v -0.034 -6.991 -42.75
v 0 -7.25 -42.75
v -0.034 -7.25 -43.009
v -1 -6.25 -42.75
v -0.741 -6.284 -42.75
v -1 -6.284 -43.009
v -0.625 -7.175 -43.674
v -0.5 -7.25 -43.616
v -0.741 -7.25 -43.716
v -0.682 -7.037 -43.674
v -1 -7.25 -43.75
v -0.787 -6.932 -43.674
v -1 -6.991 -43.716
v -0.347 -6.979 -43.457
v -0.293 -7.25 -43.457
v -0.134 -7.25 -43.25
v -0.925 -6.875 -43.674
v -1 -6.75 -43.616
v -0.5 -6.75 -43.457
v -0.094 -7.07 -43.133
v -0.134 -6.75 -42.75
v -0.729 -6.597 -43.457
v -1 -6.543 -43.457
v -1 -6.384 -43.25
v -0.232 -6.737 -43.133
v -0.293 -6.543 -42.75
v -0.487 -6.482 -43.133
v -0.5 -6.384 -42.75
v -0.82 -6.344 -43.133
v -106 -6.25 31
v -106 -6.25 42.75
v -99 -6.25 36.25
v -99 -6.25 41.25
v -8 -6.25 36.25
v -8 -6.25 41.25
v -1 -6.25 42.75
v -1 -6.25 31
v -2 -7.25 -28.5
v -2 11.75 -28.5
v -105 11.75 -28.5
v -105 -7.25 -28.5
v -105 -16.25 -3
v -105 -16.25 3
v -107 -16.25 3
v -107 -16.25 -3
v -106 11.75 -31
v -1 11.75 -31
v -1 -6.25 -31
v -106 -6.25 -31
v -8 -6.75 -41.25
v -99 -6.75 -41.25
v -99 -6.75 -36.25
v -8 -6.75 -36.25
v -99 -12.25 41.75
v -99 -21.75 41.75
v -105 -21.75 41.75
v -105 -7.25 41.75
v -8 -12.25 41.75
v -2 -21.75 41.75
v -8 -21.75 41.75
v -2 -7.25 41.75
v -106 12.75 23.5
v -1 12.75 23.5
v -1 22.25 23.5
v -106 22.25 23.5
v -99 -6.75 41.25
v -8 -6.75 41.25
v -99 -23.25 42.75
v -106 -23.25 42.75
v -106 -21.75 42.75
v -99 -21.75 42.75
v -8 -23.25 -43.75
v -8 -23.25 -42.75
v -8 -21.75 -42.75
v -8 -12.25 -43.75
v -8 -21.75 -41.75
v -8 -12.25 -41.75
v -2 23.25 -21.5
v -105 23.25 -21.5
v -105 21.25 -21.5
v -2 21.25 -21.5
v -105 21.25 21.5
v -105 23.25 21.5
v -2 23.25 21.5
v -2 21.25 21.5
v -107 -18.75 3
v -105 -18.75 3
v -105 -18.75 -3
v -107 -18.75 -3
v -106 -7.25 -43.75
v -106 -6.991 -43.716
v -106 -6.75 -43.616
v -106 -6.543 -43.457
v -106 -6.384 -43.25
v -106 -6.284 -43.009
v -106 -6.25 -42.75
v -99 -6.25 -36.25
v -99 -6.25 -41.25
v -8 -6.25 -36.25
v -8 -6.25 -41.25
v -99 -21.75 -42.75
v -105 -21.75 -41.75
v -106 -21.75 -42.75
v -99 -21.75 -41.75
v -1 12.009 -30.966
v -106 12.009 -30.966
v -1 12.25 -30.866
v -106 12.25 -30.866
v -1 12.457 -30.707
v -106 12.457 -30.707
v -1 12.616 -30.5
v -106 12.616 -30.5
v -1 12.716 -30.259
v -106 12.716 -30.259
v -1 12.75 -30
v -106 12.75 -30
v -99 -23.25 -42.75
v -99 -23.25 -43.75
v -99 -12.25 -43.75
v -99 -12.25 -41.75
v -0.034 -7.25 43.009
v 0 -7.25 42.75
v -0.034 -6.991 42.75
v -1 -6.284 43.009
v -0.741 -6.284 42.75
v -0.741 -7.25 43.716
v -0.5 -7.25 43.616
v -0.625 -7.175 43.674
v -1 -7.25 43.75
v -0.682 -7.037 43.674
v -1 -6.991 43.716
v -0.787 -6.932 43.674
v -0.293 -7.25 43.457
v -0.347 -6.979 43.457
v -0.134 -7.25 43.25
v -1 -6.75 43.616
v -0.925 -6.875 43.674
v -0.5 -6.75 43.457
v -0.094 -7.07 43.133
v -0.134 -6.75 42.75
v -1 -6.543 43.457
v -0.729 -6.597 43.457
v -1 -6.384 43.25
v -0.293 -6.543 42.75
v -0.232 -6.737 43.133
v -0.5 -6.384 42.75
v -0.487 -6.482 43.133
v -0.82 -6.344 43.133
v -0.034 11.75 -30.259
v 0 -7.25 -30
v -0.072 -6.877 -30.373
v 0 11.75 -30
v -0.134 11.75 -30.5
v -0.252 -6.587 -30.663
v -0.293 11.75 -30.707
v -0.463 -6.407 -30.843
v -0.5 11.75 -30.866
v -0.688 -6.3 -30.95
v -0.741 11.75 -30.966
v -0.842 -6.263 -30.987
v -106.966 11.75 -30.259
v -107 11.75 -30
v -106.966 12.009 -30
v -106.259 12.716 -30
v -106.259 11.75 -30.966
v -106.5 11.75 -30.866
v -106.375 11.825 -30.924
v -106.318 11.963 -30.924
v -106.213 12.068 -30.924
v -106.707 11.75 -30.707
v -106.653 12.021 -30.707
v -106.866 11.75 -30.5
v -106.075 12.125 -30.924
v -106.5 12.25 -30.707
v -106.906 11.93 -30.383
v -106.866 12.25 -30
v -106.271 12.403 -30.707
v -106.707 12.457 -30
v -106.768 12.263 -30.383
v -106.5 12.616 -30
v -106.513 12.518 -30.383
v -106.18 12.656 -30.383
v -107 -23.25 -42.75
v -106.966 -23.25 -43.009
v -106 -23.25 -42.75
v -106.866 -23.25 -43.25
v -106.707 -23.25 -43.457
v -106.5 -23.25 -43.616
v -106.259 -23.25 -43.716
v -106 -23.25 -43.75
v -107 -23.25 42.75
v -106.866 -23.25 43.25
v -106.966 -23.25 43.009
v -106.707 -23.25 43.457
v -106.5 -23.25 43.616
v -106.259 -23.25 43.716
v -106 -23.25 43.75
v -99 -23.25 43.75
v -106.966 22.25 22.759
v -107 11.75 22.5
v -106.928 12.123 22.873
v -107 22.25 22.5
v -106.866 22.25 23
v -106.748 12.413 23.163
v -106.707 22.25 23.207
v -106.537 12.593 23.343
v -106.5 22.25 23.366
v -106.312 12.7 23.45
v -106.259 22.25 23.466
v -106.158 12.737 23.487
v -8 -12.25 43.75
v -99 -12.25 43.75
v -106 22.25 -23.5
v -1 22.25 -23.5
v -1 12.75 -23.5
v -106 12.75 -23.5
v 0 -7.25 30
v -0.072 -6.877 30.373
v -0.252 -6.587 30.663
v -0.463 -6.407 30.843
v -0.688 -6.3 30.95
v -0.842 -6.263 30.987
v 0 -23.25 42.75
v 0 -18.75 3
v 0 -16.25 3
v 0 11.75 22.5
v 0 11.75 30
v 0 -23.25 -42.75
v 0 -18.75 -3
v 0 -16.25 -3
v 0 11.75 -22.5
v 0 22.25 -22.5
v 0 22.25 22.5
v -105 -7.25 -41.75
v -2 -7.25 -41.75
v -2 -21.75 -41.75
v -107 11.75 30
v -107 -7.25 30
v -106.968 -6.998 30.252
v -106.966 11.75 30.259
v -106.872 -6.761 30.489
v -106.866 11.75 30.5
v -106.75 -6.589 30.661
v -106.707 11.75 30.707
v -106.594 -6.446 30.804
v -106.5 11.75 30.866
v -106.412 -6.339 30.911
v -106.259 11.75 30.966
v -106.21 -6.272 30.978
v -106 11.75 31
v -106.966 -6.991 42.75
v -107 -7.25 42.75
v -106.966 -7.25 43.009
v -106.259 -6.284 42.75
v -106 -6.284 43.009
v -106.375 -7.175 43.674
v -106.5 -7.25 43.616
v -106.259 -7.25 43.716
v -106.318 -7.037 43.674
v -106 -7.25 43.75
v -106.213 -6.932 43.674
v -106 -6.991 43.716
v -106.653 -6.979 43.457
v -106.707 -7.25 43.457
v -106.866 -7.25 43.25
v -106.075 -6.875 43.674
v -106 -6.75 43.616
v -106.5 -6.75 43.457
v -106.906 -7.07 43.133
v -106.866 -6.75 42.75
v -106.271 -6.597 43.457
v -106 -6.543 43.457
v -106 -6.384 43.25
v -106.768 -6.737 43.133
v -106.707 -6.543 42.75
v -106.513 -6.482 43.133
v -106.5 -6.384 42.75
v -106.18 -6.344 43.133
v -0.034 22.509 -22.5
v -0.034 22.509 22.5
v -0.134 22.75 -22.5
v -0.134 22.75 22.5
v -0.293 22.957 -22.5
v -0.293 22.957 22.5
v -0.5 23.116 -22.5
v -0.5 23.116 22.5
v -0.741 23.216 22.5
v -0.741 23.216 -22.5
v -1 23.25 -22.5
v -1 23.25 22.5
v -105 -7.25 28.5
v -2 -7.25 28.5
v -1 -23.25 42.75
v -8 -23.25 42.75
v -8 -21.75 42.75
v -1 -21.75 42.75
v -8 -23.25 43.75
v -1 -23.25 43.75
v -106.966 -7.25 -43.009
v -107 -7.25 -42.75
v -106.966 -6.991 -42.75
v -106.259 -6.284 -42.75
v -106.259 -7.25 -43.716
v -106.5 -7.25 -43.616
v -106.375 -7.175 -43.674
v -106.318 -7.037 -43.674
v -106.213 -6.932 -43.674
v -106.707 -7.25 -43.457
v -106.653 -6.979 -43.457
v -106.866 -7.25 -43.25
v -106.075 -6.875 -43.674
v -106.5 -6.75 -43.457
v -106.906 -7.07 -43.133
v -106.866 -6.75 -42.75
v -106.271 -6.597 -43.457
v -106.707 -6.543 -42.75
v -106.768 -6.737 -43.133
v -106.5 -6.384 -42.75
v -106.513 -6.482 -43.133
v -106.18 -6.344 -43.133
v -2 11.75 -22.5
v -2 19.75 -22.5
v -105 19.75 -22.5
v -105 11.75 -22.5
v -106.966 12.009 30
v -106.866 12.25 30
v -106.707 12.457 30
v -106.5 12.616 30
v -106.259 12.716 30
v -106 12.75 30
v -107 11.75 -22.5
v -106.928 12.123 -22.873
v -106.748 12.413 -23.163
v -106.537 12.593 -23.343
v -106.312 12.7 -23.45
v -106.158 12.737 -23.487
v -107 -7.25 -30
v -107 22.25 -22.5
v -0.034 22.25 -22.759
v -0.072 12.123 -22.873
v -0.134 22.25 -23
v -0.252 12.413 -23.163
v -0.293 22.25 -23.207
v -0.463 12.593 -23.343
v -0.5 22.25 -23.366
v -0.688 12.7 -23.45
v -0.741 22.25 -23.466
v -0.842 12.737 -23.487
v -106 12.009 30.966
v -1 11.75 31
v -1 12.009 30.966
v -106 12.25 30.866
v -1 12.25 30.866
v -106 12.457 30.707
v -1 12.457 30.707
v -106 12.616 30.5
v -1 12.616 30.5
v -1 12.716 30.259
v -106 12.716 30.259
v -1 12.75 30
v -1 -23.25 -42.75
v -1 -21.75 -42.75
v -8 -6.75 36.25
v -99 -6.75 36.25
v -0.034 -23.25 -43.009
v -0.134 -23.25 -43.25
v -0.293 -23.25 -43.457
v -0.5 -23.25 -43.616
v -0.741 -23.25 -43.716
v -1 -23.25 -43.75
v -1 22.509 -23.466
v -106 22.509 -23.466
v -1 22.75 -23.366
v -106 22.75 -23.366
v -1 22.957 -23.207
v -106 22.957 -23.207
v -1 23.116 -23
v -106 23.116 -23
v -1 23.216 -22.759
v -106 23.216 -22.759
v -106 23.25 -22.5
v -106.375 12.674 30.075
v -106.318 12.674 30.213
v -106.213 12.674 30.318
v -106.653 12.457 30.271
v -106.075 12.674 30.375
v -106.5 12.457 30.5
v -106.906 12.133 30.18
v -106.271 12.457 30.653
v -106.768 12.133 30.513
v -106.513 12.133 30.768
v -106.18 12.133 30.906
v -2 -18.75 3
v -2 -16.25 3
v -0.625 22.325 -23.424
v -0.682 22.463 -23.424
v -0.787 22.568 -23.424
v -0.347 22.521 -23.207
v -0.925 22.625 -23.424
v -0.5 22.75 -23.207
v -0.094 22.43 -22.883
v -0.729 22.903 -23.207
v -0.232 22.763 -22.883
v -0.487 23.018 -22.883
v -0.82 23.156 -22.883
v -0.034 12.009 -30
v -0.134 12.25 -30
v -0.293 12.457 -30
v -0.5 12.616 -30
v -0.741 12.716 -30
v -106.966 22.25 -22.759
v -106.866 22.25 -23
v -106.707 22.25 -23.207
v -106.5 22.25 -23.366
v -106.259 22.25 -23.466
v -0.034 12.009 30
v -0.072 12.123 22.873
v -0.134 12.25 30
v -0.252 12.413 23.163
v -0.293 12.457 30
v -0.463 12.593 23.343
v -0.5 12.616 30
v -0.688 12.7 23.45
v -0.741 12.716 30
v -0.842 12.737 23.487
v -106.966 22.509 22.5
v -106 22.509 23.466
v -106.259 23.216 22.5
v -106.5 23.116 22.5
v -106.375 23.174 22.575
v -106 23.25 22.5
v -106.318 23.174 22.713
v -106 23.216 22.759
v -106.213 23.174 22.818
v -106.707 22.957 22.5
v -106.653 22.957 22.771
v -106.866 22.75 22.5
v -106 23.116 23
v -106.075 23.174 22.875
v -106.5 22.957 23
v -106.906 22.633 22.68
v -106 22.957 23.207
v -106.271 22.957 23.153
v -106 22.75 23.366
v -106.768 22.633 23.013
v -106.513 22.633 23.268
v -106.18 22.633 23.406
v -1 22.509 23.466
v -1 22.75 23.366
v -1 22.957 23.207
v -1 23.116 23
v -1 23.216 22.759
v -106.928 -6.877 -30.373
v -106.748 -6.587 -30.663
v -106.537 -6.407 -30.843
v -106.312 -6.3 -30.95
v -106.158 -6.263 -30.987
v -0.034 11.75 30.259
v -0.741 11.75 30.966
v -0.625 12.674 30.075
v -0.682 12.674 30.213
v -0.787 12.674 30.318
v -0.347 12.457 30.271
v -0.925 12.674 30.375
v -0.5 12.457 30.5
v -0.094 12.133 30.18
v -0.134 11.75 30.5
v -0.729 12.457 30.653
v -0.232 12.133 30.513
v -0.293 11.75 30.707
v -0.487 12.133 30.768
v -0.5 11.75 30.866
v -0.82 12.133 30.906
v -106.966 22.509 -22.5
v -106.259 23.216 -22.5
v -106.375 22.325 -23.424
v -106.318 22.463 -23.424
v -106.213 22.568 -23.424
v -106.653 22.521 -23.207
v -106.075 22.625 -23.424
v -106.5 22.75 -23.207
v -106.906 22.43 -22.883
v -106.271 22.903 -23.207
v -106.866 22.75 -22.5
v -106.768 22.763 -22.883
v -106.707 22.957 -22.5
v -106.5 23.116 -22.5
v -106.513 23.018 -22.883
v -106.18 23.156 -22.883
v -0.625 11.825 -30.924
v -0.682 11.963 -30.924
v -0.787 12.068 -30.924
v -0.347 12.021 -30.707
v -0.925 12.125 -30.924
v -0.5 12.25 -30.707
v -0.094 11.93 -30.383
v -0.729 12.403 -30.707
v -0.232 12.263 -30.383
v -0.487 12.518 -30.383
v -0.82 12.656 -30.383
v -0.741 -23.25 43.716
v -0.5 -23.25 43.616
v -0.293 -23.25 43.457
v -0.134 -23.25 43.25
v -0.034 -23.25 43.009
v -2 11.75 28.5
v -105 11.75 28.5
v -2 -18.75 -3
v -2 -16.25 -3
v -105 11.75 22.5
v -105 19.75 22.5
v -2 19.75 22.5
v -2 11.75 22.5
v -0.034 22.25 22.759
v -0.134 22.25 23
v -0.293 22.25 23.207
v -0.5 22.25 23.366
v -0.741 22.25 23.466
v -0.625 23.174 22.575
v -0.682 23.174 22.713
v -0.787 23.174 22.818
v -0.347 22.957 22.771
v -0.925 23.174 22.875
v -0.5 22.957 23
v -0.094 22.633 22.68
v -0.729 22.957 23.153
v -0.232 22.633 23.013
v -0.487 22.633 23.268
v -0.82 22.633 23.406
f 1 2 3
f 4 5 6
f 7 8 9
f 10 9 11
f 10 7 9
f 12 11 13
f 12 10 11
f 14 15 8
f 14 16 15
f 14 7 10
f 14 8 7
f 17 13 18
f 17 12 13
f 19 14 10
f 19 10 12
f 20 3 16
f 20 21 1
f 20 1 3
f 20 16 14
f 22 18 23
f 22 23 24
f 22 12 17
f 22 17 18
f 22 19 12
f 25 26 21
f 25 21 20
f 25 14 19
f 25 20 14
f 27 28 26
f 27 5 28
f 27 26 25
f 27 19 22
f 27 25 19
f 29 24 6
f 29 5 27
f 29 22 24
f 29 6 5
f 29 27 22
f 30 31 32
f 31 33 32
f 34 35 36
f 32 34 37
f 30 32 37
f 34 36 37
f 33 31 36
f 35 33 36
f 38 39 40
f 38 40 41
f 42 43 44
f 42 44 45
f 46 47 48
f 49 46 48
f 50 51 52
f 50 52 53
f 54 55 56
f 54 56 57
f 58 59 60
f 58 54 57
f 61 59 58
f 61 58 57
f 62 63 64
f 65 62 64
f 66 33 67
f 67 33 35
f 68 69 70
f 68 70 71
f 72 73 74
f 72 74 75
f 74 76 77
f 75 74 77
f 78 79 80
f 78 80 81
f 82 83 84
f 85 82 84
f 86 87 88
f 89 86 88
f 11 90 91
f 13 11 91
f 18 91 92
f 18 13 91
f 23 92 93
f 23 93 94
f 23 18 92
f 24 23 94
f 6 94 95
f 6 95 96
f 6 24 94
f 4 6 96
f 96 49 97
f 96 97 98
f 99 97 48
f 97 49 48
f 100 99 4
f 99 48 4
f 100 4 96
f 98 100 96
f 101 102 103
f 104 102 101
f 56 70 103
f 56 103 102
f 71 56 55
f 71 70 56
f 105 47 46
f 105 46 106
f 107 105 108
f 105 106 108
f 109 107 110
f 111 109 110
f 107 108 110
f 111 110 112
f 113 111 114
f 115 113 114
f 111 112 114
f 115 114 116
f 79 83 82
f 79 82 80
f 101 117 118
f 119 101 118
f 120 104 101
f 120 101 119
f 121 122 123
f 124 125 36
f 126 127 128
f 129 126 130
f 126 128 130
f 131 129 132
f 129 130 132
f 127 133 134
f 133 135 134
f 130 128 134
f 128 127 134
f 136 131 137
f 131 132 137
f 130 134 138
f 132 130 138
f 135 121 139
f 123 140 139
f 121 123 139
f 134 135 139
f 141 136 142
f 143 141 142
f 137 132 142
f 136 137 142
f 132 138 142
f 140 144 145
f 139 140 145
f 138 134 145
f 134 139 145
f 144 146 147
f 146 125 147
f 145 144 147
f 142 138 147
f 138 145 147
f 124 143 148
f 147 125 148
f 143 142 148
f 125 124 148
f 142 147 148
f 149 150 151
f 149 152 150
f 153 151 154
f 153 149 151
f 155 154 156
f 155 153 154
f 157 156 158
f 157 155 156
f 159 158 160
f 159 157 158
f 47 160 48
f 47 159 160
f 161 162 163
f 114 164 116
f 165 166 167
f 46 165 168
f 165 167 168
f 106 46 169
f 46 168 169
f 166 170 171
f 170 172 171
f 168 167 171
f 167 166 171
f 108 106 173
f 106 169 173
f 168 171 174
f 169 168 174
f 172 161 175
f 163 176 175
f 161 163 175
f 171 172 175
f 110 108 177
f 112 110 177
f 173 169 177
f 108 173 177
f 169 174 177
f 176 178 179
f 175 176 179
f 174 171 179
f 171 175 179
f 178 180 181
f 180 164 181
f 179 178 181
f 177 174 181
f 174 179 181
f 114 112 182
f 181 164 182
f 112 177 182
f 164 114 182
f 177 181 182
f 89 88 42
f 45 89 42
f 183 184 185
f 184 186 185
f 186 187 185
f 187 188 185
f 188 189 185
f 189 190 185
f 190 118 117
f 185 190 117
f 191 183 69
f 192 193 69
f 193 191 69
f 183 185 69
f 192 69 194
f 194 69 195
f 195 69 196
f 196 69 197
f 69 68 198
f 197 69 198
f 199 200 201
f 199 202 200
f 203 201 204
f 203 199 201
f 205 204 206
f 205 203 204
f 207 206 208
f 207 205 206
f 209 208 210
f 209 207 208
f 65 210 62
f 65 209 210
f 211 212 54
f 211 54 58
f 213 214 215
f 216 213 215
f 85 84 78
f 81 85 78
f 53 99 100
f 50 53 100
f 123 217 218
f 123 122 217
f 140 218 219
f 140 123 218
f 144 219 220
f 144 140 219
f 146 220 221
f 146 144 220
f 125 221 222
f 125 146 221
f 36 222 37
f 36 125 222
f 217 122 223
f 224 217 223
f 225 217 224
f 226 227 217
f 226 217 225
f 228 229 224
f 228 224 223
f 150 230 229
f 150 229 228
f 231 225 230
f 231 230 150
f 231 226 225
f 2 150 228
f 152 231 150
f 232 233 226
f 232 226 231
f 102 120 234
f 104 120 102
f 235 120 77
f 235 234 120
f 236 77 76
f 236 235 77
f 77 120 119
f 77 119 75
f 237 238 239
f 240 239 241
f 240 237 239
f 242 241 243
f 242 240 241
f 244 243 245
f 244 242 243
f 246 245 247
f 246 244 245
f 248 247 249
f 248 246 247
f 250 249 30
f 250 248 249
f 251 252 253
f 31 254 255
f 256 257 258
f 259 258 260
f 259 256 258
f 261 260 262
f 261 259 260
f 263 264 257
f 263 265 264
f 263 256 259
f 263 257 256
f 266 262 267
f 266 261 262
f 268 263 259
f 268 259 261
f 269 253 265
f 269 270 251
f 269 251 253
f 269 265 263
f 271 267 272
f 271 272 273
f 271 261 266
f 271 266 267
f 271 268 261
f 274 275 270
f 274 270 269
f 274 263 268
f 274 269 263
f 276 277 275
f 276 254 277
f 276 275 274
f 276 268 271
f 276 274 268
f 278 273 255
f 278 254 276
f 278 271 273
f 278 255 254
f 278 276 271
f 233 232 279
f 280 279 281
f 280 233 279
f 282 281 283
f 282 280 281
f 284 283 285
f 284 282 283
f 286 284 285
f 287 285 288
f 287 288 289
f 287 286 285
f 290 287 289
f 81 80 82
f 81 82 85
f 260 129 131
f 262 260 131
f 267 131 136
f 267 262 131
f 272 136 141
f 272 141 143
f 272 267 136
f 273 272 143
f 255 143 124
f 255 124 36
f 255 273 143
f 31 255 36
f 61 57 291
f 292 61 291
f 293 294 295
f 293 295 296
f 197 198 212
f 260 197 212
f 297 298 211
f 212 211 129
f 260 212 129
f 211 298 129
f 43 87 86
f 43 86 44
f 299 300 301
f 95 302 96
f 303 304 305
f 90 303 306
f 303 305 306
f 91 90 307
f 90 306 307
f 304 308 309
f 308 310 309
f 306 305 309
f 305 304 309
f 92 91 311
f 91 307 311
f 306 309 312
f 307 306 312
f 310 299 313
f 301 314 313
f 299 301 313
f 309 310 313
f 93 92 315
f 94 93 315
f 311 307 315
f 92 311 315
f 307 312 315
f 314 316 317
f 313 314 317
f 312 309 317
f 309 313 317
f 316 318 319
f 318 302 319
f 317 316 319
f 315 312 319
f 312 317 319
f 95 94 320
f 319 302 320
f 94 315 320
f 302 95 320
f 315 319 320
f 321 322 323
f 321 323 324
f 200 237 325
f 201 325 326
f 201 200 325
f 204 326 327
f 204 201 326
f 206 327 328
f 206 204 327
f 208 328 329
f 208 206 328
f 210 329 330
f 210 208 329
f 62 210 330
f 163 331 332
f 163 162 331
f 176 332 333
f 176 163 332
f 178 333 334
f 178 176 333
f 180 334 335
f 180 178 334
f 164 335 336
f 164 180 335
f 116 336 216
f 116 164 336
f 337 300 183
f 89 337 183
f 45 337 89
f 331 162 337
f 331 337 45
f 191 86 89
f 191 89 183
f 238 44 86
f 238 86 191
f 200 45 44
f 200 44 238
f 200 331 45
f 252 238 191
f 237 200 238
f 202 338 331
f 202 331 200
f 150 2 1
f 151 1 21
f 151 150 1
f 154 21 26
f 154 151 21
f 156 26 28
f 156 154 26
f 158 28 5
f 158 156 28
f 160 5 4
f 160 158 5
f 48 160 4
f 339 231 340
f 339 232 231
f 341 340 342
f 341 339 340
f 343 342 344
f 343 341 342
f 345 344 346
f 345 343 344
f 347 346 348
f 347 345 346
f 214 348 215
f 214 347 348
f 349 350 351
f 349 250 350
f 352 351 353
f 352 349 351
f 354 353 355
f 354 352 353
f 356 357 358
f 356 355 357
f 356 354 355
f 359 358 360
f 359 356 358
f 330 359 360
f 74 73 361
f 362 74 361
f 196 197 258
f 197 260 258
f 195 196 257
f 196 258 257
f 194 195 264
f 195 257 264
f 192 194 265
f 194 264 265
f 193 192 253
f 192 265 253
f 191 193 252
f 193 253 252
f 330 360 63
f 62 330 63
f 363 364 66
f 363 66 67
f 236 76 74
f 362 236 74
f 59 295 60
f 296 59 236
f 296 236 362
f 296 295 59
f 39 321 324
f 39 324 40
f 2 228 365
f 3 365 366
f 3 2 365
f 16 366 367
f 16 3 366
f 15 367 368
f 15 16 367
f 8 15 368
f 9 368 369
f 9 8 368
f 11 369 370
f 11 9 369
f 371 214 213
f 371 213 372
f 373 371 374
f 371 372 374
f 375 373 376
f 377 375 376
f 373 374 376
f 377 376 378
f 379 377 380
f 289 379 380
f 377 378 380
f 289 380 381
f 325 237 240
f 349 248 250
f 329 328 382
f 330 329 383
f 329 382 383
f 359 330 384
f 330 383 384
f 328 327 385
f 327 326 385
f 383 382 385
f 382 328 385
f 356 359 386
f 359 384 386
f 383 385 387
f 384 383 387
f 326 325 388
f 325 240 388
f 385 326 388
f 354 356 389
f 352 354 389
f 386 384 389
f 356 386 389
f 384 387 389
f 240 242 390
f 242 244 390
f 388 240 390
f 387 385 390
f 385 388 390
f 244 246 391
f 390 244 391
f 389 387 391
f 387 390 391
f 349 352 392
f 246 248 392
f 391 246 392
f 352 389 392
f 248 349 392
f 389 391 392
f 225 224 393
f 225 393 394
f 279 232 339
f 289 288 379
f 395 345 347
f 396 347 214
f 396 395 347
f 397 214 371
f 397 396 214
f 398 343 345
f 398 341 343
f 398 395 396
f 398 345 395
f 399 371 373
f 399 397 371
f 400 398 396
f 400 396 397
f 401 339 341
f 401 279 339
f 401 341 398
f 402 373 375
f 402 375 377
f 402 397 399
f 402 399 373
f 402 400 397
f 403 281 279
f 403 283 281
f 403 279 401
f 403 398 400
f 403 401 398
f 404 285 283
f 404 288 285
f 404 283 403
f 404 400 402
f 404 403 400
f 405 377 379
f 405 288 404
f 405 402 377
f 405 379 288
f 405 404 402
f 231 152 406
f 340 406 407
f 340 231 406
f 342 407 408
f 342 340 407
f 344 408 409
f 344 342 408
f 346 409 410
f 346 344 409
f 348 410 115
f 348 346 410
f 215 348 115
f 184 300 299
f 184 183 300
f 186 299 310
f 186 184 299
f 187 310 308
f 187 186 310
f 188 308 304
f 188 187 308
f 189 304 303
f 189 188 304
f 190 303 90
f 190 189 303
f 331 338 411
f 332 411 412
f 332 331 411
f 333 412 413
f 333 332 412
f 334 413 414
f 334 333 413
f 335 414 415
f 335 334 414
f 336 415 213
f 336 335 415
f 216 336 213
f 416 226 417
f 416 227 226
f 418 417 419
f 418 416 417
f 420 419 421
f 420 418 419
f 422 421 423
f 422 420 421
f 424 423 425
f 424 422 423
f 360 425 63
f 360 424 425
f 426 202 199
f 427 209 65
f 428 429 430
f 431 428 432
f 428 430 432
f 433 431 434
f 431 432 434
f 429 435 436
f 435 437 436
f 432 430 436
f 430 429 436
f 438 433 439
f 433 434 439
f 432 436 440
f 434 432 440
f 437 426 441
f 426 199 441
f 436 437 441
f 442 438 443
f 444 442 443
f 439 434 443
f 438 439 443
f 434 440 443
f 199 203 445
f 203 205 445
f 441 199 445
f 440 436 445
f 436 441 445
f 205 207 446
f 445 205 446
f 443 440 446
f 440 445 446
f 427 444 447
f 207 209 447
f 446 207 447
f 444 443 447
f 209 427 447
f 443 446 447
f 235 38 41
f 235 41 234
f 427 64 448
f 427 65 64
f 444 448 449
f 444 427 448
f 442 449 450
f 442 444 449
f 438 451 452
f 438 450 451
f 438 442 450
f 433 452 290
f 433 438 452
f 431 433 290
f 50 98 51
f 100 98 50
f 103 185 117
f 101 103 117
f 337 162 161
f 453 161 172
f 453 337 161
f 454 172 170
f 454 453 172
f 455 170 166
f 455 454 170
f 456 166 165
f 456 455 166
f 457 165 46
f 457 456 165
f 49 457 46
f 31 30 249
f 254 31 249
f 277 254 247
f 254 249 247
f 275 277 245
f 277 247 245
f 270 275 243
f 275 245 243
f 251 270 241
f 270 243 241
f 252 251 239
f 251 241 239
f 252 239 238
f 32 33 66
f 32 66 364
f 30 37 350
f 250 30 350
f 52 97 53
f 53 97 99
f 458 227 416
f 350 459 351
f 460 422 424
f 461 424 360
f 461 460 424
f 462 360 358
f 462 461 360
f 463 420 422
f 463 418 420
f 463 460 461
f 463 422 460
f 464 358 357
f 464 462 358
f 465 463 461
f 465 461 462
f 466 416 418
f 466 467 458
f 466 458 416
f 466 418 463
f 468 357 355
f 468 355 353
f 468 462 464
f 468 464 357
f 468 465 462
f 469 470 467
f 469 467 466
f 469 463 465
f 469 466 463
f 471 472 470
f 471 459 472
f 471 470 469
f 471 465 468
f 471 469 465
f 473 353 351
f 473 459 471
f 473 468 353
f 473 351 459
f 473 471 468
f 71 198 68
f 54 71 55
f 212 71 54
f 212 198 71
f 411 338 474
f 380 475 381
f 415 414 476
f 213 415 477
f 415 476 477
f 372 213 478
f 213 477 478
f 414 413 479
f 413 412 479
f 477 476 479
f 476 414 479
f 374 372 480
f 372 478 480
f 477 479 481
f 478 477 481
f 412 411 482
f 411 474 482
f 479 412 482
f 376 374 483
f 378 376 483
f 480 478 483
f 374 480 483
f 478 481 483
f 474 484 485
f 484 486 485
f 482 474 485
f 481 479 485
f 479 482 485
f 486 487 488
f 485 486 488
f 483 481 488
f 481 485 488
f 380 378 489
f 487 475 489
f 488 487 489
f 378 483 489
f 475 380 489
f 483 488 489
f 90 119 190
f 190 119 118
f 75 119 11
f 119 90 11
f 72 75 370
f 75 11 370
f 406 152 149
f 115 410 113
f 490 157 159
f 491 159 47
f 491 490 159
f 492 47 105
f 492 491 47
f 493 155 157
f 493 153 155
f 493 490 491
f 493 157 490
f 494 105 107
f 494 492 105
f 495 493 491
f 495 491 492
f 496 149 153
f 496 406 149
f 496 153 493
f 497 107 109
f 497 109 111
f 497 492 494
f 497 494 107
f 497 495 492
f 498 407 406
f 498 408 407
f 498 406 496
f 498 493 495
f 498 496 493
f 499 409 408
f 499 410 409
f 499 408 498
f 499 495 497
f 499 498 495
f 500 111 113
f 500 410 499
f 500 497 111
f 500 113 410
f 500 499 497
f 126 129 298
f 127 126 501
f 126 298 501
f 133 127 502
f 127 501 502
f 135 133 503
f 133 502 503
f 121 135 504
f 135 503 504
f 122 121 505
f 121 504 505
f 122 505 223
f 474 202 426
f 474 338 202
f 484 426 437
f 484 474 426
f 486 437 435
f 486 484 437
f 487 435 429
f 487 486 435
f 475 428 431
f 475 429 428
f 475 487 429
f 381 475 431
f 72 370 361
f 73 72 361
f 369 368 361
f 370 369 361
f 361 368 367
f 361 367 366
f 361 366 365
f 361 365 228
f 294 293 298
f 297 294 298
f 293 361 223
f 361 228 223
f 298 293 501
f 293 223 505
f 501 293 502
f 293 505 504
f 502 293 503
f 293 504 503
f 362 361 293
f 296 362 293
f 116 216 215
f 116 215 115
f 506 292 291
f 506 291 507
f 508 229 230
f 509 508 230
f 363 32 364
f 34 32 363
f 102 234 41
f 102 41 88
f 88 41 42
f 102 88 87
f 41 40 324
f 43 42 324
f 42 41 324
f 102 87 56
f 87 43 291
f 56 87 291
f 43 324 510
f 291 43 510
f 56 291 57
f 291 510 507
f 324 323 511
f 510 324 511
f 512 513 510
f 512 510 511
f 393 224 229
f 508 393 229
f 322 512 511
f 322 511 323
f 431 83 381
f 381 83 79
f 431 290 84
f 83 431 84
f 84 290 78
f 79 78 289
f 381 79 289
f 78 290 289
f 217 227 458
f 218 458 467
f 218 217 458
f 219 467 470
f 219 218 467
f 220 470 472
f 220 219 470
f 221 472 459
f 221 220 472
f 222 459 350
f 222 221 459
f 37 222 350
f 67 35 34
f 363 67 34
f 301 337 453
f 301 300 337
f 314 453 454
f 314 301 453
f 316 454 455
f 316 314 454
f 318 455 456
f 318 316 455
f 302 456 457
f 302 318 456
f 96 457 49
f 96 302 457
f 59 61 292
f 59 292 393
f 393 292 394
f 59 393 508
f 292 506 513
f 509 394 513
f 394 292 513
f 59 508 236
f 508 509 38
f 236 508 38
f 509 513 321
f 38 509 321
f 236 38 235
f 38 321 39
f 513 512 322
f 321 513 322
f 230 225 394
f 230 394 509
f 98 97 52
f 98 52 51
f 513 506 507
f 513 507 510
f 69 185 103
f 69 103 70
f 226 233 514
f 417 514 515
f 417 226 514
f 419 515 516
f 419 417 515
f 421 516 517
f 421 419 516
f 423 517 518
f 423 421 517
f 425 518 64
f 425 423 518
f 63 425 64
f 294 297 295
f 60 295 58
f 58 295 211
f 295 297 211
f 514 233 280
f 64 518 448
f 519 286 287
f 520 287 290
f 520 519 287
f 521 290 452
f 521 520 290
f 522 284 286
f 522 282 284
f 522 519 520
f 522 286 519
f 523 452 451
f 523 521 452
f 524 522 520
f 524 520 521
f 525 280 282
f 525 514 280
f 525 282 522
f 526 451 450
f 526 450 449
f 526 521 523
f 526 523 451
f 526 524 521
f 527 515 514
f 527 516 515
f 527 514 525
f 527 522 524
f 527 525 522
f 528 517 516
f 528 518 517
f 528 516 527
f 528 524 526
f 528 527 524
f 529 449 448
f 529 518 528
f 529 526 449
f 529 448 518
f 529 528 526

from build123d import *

# Parameters (mm, degrees)
BOSS_EXTRUDE1_DEPTH = 2
BOSS_EXTRUDE2_DEPTH = 103
BOSS_EXTRUDE3_DEPTH = 2
SKETCH4_W           = 103
SKETCH4_H           = 43
CUT_EXTRUDE1_DEPTH  = 2
SKETCH5_W           = 91
SKETCH5_H           = 5
CUT_EXTRUDE2_DEPTH  = 0.5
SKETCH7_W           = 105
SKETCH7_H           = 85.5
SKETCH7_W_2         = 103
SKETCH7_H_2         = 83.5
CUT_EXTRUDE3_DEPTH  = 1.5
CUT_EXTRUDE4_REACH  = 142.164
SKETCH8_W           = 91
SKETCH8_H           = 11
CUT_EXTRUDE5_REACH  = 119.914
SKETCH9_W           = 6
SKETCH9_H           = 2.5
FILLET1_R           = 1


with BuildPart() as part:
    # Sketch1 → Boss-Extrude1 (new body)
    with BuildSketch(Plane(origin=(0, 0, 0), x_dir=(0, 0, -1), z_dir=(1, 0, 0))):
        Polygon((-43.75, -23.25), (43.75, -23.25), (43.75, -6.25), (31, -6.25), (31, 12.75), (23.5, 12.75), (23.5, 23.25), (-23.5, 23.25), (-23.5, 12.75), (-31, 12.75), (-31, -6.25), (-43.75, -6.25), align=None)
    extrude(amount=-BOSS_EXTRUDE1_DEPTH)

    # Sketch2 → Boss-Extrude2 (add)
    with BuildSketch(Plane.ZY.offset(2)):
        Polygon((-43.75, -23.25), (-43.75, -6.25), (-31, -6.25), (-31, 12.75), (-23.5, 12.75), (-23.5, 23.25), (23.5, 23.25), (23.5, 12.75), (31, 12.75), (31, -6.25), (43.75, -6.25), (43.75, -23.25), (41.75, -23.25), (41.75, -7.25), (28.5, -7.25), (28.5, 11.75), (22.5, 11.75), (22.5, 19.75), (-22.5, 19.75), (-22.5, 11.75), (-28.5, 11.75), (-28.5, -7.25), (-41.75, -7.25), (-41.75, -23.25), align=None)
    extrude(amount=BOSS_EXTRUDE2_DEPTH)

    # Sketch3 → Boss-Extrude3 (add)
    with BuildSketch(Plane.ZY.offset(105)):
        Polygon((43.75, -23.25), (43.75, -6.25), (31, -6.25), (31, 12.75), (23.5, 12.75), (23.5, 23.25), (-23.5, 23.25), (-23.5, 12.75), (-31, 12.75), (-31, -6.25), (-43.75, -6.25), (-43.75, -23.25), align=None)
    extrude(amount=BOSS_EXTRUDE3_DEPTH)

    # Sketch4 → Cut-Extrude1 (cut)
    with BuildSketch(Plane(origin=(0, 23.25, 0), x_dir=(1, 0, 0), z_dir=(0, 1, 0))):
        with Locations((-53.5, 0)):
            Rectangle(SKETCH4_W, SKETCH4_H)
    extrude(amount=-CUT_EXTRUDE1_DEPTH, mode=Mode.SUBTRACT)

    # Sketch5 → Cut-Extrude2 (cut)
    with BuildSketch(Plane(origin=(0, -6.25, 0), x_dir=(1, 0, 0), z_dir=(0, 1, 0))):
        with Locations((-53.5, -38.75)):
            Rectangle(SKETCH5_W, SKETCH5_H)
        with Locations((-53.5, 38.75)):
            Rectangle(SKETCH5_W, SKETCH5_H)
    extrude(amount=-CUT_EXTRUDE2_DEPTH, mode=Mode.SUBTRACT)

    # Sketch7 → Cut-Extrude3 (cut)
    with BuildSketch(Plane.XZ.offset(23.25)):
        with Locations((-53.5, 0)):
            Rectangle(SKETCH7_W, SKETCH7_H)
        with Locations((-53.5, 0)):
            Rectangle(SKETCH7_W_2, SKETCH7_H_2, mode=Mode.SUBTRACT)
    extrude(amount=-CUT_EXTRUDE3_DEPTH, mode=Mode.SUBTRACT)

    # Cut-Extrude4: up to this face of the body (flat: up to its plane)
    cut_extrude4_end = Plane(part.part.faces().sort_by_distance((-53.5, -14.75, -43.75))[0])
    # Sketch8 → Cut-Extrude4 (cut, up to the picked face)
    with BuildSketch(Plane.XY.offset(43.75), mode=Mode.PRIVATE) as cut_extrude4_sk1:
        with Locations((-53.5, -17.75)):
            Rectangle(SKETCH8_W, SKETCH8_H)
    cut_extrude4_tool1 = split(extrude(cut_extrude4_sk1.sketch, amount=-CUT_EXTRUDE4_REACH, mode=Mode.PRIVATE), bisect_by=cut_extrude4_end, keep=Keep.BOTH, mode=Mode.PRIVATE)
    add(cut_extrude4_tool1.solids().sort_by(Axis((-53.5, -17.75, 43.75), (0, 0, -1)))[0], mode=Mode.SUBTRACT)

    # Cut-Extrude5: up to this face of the body (flat: up to its plane)
    cut_extrude5_end = Plane(part.part.faces().sort_by_distance((-107, -2.921533713, 0))[0])
    # Sketch9 → Cut-Extrude5 (cut, up to the picked face)
    with BuildSketch(Plane(origin=(0, 0, 0), x_dir=(0, 0, -1), z_dir=(1, 0, 0)), mode=Mode.PRIVATE) as cut_extrude5_sk1:
        with Locations((0, -17.5)):
            Rectangle(SKETCH9_W, SKETCH9_H)
    cut_extrude5_tool1 = split(extrude(cut_extrude5_sk1.sketch, amount=-CUT_EXTRUDE5_REACH, mode=Mode.PRIVATE), bisect_by=cut_extrude5_end, keep=Keep.BOTH, mode=Mode.PRIVATE)
    add(cut_extrude5_tool1.solids().sort_by(Axis((0, -17.5, 0), (-1, 0, 0)))[0], mode=Mode.SUBTRACT)

    # Fillet1
    fillet1_edges = [part.edges().sort_by_distance(p)[0] for p in [
        (-107, -6.25, 37.375),
        (-107, 3.25, 31),
        (-107, 12.75, 27.25),
        (-107, 18, 23.5),
        (-107, 23.25, 0),
        (-107, 18, -23.5),
        (-107, 12.75, -27.25),
        (-107, 3.25, -31),
        (-107, -6.25, -37.375),
        (-107, -14.75, -43.75),
        (-107, -14.75, 43.75),
        (0, -6.25, 37.375),
        (0, 3.25, 31),
        (0, 12.75, 27.25),
        (0, 18, 23.5),
        (0, 23.25, 0),
        (0, 18, -23.5),
        (0, 12.75, -27.25),
        (0, 3.25, -31),
        (0, -6.25, -37.375),
        (0, -14.75, -43.75),
        (0, -14.75, 43.75),
        (-53.5, -6.25, 43.75),
        (-53.5, 12.75, 31),
        (-53.5, 23.25, 23.5),
        (-53.5, 23.25, -23.5),
        (-53.5, 12.75, -31),
        (-53.5, -6.25, -43.75),
    ]]
    fillet(fillet1_edges, radius=FILLET1_R)


solid = part.part
